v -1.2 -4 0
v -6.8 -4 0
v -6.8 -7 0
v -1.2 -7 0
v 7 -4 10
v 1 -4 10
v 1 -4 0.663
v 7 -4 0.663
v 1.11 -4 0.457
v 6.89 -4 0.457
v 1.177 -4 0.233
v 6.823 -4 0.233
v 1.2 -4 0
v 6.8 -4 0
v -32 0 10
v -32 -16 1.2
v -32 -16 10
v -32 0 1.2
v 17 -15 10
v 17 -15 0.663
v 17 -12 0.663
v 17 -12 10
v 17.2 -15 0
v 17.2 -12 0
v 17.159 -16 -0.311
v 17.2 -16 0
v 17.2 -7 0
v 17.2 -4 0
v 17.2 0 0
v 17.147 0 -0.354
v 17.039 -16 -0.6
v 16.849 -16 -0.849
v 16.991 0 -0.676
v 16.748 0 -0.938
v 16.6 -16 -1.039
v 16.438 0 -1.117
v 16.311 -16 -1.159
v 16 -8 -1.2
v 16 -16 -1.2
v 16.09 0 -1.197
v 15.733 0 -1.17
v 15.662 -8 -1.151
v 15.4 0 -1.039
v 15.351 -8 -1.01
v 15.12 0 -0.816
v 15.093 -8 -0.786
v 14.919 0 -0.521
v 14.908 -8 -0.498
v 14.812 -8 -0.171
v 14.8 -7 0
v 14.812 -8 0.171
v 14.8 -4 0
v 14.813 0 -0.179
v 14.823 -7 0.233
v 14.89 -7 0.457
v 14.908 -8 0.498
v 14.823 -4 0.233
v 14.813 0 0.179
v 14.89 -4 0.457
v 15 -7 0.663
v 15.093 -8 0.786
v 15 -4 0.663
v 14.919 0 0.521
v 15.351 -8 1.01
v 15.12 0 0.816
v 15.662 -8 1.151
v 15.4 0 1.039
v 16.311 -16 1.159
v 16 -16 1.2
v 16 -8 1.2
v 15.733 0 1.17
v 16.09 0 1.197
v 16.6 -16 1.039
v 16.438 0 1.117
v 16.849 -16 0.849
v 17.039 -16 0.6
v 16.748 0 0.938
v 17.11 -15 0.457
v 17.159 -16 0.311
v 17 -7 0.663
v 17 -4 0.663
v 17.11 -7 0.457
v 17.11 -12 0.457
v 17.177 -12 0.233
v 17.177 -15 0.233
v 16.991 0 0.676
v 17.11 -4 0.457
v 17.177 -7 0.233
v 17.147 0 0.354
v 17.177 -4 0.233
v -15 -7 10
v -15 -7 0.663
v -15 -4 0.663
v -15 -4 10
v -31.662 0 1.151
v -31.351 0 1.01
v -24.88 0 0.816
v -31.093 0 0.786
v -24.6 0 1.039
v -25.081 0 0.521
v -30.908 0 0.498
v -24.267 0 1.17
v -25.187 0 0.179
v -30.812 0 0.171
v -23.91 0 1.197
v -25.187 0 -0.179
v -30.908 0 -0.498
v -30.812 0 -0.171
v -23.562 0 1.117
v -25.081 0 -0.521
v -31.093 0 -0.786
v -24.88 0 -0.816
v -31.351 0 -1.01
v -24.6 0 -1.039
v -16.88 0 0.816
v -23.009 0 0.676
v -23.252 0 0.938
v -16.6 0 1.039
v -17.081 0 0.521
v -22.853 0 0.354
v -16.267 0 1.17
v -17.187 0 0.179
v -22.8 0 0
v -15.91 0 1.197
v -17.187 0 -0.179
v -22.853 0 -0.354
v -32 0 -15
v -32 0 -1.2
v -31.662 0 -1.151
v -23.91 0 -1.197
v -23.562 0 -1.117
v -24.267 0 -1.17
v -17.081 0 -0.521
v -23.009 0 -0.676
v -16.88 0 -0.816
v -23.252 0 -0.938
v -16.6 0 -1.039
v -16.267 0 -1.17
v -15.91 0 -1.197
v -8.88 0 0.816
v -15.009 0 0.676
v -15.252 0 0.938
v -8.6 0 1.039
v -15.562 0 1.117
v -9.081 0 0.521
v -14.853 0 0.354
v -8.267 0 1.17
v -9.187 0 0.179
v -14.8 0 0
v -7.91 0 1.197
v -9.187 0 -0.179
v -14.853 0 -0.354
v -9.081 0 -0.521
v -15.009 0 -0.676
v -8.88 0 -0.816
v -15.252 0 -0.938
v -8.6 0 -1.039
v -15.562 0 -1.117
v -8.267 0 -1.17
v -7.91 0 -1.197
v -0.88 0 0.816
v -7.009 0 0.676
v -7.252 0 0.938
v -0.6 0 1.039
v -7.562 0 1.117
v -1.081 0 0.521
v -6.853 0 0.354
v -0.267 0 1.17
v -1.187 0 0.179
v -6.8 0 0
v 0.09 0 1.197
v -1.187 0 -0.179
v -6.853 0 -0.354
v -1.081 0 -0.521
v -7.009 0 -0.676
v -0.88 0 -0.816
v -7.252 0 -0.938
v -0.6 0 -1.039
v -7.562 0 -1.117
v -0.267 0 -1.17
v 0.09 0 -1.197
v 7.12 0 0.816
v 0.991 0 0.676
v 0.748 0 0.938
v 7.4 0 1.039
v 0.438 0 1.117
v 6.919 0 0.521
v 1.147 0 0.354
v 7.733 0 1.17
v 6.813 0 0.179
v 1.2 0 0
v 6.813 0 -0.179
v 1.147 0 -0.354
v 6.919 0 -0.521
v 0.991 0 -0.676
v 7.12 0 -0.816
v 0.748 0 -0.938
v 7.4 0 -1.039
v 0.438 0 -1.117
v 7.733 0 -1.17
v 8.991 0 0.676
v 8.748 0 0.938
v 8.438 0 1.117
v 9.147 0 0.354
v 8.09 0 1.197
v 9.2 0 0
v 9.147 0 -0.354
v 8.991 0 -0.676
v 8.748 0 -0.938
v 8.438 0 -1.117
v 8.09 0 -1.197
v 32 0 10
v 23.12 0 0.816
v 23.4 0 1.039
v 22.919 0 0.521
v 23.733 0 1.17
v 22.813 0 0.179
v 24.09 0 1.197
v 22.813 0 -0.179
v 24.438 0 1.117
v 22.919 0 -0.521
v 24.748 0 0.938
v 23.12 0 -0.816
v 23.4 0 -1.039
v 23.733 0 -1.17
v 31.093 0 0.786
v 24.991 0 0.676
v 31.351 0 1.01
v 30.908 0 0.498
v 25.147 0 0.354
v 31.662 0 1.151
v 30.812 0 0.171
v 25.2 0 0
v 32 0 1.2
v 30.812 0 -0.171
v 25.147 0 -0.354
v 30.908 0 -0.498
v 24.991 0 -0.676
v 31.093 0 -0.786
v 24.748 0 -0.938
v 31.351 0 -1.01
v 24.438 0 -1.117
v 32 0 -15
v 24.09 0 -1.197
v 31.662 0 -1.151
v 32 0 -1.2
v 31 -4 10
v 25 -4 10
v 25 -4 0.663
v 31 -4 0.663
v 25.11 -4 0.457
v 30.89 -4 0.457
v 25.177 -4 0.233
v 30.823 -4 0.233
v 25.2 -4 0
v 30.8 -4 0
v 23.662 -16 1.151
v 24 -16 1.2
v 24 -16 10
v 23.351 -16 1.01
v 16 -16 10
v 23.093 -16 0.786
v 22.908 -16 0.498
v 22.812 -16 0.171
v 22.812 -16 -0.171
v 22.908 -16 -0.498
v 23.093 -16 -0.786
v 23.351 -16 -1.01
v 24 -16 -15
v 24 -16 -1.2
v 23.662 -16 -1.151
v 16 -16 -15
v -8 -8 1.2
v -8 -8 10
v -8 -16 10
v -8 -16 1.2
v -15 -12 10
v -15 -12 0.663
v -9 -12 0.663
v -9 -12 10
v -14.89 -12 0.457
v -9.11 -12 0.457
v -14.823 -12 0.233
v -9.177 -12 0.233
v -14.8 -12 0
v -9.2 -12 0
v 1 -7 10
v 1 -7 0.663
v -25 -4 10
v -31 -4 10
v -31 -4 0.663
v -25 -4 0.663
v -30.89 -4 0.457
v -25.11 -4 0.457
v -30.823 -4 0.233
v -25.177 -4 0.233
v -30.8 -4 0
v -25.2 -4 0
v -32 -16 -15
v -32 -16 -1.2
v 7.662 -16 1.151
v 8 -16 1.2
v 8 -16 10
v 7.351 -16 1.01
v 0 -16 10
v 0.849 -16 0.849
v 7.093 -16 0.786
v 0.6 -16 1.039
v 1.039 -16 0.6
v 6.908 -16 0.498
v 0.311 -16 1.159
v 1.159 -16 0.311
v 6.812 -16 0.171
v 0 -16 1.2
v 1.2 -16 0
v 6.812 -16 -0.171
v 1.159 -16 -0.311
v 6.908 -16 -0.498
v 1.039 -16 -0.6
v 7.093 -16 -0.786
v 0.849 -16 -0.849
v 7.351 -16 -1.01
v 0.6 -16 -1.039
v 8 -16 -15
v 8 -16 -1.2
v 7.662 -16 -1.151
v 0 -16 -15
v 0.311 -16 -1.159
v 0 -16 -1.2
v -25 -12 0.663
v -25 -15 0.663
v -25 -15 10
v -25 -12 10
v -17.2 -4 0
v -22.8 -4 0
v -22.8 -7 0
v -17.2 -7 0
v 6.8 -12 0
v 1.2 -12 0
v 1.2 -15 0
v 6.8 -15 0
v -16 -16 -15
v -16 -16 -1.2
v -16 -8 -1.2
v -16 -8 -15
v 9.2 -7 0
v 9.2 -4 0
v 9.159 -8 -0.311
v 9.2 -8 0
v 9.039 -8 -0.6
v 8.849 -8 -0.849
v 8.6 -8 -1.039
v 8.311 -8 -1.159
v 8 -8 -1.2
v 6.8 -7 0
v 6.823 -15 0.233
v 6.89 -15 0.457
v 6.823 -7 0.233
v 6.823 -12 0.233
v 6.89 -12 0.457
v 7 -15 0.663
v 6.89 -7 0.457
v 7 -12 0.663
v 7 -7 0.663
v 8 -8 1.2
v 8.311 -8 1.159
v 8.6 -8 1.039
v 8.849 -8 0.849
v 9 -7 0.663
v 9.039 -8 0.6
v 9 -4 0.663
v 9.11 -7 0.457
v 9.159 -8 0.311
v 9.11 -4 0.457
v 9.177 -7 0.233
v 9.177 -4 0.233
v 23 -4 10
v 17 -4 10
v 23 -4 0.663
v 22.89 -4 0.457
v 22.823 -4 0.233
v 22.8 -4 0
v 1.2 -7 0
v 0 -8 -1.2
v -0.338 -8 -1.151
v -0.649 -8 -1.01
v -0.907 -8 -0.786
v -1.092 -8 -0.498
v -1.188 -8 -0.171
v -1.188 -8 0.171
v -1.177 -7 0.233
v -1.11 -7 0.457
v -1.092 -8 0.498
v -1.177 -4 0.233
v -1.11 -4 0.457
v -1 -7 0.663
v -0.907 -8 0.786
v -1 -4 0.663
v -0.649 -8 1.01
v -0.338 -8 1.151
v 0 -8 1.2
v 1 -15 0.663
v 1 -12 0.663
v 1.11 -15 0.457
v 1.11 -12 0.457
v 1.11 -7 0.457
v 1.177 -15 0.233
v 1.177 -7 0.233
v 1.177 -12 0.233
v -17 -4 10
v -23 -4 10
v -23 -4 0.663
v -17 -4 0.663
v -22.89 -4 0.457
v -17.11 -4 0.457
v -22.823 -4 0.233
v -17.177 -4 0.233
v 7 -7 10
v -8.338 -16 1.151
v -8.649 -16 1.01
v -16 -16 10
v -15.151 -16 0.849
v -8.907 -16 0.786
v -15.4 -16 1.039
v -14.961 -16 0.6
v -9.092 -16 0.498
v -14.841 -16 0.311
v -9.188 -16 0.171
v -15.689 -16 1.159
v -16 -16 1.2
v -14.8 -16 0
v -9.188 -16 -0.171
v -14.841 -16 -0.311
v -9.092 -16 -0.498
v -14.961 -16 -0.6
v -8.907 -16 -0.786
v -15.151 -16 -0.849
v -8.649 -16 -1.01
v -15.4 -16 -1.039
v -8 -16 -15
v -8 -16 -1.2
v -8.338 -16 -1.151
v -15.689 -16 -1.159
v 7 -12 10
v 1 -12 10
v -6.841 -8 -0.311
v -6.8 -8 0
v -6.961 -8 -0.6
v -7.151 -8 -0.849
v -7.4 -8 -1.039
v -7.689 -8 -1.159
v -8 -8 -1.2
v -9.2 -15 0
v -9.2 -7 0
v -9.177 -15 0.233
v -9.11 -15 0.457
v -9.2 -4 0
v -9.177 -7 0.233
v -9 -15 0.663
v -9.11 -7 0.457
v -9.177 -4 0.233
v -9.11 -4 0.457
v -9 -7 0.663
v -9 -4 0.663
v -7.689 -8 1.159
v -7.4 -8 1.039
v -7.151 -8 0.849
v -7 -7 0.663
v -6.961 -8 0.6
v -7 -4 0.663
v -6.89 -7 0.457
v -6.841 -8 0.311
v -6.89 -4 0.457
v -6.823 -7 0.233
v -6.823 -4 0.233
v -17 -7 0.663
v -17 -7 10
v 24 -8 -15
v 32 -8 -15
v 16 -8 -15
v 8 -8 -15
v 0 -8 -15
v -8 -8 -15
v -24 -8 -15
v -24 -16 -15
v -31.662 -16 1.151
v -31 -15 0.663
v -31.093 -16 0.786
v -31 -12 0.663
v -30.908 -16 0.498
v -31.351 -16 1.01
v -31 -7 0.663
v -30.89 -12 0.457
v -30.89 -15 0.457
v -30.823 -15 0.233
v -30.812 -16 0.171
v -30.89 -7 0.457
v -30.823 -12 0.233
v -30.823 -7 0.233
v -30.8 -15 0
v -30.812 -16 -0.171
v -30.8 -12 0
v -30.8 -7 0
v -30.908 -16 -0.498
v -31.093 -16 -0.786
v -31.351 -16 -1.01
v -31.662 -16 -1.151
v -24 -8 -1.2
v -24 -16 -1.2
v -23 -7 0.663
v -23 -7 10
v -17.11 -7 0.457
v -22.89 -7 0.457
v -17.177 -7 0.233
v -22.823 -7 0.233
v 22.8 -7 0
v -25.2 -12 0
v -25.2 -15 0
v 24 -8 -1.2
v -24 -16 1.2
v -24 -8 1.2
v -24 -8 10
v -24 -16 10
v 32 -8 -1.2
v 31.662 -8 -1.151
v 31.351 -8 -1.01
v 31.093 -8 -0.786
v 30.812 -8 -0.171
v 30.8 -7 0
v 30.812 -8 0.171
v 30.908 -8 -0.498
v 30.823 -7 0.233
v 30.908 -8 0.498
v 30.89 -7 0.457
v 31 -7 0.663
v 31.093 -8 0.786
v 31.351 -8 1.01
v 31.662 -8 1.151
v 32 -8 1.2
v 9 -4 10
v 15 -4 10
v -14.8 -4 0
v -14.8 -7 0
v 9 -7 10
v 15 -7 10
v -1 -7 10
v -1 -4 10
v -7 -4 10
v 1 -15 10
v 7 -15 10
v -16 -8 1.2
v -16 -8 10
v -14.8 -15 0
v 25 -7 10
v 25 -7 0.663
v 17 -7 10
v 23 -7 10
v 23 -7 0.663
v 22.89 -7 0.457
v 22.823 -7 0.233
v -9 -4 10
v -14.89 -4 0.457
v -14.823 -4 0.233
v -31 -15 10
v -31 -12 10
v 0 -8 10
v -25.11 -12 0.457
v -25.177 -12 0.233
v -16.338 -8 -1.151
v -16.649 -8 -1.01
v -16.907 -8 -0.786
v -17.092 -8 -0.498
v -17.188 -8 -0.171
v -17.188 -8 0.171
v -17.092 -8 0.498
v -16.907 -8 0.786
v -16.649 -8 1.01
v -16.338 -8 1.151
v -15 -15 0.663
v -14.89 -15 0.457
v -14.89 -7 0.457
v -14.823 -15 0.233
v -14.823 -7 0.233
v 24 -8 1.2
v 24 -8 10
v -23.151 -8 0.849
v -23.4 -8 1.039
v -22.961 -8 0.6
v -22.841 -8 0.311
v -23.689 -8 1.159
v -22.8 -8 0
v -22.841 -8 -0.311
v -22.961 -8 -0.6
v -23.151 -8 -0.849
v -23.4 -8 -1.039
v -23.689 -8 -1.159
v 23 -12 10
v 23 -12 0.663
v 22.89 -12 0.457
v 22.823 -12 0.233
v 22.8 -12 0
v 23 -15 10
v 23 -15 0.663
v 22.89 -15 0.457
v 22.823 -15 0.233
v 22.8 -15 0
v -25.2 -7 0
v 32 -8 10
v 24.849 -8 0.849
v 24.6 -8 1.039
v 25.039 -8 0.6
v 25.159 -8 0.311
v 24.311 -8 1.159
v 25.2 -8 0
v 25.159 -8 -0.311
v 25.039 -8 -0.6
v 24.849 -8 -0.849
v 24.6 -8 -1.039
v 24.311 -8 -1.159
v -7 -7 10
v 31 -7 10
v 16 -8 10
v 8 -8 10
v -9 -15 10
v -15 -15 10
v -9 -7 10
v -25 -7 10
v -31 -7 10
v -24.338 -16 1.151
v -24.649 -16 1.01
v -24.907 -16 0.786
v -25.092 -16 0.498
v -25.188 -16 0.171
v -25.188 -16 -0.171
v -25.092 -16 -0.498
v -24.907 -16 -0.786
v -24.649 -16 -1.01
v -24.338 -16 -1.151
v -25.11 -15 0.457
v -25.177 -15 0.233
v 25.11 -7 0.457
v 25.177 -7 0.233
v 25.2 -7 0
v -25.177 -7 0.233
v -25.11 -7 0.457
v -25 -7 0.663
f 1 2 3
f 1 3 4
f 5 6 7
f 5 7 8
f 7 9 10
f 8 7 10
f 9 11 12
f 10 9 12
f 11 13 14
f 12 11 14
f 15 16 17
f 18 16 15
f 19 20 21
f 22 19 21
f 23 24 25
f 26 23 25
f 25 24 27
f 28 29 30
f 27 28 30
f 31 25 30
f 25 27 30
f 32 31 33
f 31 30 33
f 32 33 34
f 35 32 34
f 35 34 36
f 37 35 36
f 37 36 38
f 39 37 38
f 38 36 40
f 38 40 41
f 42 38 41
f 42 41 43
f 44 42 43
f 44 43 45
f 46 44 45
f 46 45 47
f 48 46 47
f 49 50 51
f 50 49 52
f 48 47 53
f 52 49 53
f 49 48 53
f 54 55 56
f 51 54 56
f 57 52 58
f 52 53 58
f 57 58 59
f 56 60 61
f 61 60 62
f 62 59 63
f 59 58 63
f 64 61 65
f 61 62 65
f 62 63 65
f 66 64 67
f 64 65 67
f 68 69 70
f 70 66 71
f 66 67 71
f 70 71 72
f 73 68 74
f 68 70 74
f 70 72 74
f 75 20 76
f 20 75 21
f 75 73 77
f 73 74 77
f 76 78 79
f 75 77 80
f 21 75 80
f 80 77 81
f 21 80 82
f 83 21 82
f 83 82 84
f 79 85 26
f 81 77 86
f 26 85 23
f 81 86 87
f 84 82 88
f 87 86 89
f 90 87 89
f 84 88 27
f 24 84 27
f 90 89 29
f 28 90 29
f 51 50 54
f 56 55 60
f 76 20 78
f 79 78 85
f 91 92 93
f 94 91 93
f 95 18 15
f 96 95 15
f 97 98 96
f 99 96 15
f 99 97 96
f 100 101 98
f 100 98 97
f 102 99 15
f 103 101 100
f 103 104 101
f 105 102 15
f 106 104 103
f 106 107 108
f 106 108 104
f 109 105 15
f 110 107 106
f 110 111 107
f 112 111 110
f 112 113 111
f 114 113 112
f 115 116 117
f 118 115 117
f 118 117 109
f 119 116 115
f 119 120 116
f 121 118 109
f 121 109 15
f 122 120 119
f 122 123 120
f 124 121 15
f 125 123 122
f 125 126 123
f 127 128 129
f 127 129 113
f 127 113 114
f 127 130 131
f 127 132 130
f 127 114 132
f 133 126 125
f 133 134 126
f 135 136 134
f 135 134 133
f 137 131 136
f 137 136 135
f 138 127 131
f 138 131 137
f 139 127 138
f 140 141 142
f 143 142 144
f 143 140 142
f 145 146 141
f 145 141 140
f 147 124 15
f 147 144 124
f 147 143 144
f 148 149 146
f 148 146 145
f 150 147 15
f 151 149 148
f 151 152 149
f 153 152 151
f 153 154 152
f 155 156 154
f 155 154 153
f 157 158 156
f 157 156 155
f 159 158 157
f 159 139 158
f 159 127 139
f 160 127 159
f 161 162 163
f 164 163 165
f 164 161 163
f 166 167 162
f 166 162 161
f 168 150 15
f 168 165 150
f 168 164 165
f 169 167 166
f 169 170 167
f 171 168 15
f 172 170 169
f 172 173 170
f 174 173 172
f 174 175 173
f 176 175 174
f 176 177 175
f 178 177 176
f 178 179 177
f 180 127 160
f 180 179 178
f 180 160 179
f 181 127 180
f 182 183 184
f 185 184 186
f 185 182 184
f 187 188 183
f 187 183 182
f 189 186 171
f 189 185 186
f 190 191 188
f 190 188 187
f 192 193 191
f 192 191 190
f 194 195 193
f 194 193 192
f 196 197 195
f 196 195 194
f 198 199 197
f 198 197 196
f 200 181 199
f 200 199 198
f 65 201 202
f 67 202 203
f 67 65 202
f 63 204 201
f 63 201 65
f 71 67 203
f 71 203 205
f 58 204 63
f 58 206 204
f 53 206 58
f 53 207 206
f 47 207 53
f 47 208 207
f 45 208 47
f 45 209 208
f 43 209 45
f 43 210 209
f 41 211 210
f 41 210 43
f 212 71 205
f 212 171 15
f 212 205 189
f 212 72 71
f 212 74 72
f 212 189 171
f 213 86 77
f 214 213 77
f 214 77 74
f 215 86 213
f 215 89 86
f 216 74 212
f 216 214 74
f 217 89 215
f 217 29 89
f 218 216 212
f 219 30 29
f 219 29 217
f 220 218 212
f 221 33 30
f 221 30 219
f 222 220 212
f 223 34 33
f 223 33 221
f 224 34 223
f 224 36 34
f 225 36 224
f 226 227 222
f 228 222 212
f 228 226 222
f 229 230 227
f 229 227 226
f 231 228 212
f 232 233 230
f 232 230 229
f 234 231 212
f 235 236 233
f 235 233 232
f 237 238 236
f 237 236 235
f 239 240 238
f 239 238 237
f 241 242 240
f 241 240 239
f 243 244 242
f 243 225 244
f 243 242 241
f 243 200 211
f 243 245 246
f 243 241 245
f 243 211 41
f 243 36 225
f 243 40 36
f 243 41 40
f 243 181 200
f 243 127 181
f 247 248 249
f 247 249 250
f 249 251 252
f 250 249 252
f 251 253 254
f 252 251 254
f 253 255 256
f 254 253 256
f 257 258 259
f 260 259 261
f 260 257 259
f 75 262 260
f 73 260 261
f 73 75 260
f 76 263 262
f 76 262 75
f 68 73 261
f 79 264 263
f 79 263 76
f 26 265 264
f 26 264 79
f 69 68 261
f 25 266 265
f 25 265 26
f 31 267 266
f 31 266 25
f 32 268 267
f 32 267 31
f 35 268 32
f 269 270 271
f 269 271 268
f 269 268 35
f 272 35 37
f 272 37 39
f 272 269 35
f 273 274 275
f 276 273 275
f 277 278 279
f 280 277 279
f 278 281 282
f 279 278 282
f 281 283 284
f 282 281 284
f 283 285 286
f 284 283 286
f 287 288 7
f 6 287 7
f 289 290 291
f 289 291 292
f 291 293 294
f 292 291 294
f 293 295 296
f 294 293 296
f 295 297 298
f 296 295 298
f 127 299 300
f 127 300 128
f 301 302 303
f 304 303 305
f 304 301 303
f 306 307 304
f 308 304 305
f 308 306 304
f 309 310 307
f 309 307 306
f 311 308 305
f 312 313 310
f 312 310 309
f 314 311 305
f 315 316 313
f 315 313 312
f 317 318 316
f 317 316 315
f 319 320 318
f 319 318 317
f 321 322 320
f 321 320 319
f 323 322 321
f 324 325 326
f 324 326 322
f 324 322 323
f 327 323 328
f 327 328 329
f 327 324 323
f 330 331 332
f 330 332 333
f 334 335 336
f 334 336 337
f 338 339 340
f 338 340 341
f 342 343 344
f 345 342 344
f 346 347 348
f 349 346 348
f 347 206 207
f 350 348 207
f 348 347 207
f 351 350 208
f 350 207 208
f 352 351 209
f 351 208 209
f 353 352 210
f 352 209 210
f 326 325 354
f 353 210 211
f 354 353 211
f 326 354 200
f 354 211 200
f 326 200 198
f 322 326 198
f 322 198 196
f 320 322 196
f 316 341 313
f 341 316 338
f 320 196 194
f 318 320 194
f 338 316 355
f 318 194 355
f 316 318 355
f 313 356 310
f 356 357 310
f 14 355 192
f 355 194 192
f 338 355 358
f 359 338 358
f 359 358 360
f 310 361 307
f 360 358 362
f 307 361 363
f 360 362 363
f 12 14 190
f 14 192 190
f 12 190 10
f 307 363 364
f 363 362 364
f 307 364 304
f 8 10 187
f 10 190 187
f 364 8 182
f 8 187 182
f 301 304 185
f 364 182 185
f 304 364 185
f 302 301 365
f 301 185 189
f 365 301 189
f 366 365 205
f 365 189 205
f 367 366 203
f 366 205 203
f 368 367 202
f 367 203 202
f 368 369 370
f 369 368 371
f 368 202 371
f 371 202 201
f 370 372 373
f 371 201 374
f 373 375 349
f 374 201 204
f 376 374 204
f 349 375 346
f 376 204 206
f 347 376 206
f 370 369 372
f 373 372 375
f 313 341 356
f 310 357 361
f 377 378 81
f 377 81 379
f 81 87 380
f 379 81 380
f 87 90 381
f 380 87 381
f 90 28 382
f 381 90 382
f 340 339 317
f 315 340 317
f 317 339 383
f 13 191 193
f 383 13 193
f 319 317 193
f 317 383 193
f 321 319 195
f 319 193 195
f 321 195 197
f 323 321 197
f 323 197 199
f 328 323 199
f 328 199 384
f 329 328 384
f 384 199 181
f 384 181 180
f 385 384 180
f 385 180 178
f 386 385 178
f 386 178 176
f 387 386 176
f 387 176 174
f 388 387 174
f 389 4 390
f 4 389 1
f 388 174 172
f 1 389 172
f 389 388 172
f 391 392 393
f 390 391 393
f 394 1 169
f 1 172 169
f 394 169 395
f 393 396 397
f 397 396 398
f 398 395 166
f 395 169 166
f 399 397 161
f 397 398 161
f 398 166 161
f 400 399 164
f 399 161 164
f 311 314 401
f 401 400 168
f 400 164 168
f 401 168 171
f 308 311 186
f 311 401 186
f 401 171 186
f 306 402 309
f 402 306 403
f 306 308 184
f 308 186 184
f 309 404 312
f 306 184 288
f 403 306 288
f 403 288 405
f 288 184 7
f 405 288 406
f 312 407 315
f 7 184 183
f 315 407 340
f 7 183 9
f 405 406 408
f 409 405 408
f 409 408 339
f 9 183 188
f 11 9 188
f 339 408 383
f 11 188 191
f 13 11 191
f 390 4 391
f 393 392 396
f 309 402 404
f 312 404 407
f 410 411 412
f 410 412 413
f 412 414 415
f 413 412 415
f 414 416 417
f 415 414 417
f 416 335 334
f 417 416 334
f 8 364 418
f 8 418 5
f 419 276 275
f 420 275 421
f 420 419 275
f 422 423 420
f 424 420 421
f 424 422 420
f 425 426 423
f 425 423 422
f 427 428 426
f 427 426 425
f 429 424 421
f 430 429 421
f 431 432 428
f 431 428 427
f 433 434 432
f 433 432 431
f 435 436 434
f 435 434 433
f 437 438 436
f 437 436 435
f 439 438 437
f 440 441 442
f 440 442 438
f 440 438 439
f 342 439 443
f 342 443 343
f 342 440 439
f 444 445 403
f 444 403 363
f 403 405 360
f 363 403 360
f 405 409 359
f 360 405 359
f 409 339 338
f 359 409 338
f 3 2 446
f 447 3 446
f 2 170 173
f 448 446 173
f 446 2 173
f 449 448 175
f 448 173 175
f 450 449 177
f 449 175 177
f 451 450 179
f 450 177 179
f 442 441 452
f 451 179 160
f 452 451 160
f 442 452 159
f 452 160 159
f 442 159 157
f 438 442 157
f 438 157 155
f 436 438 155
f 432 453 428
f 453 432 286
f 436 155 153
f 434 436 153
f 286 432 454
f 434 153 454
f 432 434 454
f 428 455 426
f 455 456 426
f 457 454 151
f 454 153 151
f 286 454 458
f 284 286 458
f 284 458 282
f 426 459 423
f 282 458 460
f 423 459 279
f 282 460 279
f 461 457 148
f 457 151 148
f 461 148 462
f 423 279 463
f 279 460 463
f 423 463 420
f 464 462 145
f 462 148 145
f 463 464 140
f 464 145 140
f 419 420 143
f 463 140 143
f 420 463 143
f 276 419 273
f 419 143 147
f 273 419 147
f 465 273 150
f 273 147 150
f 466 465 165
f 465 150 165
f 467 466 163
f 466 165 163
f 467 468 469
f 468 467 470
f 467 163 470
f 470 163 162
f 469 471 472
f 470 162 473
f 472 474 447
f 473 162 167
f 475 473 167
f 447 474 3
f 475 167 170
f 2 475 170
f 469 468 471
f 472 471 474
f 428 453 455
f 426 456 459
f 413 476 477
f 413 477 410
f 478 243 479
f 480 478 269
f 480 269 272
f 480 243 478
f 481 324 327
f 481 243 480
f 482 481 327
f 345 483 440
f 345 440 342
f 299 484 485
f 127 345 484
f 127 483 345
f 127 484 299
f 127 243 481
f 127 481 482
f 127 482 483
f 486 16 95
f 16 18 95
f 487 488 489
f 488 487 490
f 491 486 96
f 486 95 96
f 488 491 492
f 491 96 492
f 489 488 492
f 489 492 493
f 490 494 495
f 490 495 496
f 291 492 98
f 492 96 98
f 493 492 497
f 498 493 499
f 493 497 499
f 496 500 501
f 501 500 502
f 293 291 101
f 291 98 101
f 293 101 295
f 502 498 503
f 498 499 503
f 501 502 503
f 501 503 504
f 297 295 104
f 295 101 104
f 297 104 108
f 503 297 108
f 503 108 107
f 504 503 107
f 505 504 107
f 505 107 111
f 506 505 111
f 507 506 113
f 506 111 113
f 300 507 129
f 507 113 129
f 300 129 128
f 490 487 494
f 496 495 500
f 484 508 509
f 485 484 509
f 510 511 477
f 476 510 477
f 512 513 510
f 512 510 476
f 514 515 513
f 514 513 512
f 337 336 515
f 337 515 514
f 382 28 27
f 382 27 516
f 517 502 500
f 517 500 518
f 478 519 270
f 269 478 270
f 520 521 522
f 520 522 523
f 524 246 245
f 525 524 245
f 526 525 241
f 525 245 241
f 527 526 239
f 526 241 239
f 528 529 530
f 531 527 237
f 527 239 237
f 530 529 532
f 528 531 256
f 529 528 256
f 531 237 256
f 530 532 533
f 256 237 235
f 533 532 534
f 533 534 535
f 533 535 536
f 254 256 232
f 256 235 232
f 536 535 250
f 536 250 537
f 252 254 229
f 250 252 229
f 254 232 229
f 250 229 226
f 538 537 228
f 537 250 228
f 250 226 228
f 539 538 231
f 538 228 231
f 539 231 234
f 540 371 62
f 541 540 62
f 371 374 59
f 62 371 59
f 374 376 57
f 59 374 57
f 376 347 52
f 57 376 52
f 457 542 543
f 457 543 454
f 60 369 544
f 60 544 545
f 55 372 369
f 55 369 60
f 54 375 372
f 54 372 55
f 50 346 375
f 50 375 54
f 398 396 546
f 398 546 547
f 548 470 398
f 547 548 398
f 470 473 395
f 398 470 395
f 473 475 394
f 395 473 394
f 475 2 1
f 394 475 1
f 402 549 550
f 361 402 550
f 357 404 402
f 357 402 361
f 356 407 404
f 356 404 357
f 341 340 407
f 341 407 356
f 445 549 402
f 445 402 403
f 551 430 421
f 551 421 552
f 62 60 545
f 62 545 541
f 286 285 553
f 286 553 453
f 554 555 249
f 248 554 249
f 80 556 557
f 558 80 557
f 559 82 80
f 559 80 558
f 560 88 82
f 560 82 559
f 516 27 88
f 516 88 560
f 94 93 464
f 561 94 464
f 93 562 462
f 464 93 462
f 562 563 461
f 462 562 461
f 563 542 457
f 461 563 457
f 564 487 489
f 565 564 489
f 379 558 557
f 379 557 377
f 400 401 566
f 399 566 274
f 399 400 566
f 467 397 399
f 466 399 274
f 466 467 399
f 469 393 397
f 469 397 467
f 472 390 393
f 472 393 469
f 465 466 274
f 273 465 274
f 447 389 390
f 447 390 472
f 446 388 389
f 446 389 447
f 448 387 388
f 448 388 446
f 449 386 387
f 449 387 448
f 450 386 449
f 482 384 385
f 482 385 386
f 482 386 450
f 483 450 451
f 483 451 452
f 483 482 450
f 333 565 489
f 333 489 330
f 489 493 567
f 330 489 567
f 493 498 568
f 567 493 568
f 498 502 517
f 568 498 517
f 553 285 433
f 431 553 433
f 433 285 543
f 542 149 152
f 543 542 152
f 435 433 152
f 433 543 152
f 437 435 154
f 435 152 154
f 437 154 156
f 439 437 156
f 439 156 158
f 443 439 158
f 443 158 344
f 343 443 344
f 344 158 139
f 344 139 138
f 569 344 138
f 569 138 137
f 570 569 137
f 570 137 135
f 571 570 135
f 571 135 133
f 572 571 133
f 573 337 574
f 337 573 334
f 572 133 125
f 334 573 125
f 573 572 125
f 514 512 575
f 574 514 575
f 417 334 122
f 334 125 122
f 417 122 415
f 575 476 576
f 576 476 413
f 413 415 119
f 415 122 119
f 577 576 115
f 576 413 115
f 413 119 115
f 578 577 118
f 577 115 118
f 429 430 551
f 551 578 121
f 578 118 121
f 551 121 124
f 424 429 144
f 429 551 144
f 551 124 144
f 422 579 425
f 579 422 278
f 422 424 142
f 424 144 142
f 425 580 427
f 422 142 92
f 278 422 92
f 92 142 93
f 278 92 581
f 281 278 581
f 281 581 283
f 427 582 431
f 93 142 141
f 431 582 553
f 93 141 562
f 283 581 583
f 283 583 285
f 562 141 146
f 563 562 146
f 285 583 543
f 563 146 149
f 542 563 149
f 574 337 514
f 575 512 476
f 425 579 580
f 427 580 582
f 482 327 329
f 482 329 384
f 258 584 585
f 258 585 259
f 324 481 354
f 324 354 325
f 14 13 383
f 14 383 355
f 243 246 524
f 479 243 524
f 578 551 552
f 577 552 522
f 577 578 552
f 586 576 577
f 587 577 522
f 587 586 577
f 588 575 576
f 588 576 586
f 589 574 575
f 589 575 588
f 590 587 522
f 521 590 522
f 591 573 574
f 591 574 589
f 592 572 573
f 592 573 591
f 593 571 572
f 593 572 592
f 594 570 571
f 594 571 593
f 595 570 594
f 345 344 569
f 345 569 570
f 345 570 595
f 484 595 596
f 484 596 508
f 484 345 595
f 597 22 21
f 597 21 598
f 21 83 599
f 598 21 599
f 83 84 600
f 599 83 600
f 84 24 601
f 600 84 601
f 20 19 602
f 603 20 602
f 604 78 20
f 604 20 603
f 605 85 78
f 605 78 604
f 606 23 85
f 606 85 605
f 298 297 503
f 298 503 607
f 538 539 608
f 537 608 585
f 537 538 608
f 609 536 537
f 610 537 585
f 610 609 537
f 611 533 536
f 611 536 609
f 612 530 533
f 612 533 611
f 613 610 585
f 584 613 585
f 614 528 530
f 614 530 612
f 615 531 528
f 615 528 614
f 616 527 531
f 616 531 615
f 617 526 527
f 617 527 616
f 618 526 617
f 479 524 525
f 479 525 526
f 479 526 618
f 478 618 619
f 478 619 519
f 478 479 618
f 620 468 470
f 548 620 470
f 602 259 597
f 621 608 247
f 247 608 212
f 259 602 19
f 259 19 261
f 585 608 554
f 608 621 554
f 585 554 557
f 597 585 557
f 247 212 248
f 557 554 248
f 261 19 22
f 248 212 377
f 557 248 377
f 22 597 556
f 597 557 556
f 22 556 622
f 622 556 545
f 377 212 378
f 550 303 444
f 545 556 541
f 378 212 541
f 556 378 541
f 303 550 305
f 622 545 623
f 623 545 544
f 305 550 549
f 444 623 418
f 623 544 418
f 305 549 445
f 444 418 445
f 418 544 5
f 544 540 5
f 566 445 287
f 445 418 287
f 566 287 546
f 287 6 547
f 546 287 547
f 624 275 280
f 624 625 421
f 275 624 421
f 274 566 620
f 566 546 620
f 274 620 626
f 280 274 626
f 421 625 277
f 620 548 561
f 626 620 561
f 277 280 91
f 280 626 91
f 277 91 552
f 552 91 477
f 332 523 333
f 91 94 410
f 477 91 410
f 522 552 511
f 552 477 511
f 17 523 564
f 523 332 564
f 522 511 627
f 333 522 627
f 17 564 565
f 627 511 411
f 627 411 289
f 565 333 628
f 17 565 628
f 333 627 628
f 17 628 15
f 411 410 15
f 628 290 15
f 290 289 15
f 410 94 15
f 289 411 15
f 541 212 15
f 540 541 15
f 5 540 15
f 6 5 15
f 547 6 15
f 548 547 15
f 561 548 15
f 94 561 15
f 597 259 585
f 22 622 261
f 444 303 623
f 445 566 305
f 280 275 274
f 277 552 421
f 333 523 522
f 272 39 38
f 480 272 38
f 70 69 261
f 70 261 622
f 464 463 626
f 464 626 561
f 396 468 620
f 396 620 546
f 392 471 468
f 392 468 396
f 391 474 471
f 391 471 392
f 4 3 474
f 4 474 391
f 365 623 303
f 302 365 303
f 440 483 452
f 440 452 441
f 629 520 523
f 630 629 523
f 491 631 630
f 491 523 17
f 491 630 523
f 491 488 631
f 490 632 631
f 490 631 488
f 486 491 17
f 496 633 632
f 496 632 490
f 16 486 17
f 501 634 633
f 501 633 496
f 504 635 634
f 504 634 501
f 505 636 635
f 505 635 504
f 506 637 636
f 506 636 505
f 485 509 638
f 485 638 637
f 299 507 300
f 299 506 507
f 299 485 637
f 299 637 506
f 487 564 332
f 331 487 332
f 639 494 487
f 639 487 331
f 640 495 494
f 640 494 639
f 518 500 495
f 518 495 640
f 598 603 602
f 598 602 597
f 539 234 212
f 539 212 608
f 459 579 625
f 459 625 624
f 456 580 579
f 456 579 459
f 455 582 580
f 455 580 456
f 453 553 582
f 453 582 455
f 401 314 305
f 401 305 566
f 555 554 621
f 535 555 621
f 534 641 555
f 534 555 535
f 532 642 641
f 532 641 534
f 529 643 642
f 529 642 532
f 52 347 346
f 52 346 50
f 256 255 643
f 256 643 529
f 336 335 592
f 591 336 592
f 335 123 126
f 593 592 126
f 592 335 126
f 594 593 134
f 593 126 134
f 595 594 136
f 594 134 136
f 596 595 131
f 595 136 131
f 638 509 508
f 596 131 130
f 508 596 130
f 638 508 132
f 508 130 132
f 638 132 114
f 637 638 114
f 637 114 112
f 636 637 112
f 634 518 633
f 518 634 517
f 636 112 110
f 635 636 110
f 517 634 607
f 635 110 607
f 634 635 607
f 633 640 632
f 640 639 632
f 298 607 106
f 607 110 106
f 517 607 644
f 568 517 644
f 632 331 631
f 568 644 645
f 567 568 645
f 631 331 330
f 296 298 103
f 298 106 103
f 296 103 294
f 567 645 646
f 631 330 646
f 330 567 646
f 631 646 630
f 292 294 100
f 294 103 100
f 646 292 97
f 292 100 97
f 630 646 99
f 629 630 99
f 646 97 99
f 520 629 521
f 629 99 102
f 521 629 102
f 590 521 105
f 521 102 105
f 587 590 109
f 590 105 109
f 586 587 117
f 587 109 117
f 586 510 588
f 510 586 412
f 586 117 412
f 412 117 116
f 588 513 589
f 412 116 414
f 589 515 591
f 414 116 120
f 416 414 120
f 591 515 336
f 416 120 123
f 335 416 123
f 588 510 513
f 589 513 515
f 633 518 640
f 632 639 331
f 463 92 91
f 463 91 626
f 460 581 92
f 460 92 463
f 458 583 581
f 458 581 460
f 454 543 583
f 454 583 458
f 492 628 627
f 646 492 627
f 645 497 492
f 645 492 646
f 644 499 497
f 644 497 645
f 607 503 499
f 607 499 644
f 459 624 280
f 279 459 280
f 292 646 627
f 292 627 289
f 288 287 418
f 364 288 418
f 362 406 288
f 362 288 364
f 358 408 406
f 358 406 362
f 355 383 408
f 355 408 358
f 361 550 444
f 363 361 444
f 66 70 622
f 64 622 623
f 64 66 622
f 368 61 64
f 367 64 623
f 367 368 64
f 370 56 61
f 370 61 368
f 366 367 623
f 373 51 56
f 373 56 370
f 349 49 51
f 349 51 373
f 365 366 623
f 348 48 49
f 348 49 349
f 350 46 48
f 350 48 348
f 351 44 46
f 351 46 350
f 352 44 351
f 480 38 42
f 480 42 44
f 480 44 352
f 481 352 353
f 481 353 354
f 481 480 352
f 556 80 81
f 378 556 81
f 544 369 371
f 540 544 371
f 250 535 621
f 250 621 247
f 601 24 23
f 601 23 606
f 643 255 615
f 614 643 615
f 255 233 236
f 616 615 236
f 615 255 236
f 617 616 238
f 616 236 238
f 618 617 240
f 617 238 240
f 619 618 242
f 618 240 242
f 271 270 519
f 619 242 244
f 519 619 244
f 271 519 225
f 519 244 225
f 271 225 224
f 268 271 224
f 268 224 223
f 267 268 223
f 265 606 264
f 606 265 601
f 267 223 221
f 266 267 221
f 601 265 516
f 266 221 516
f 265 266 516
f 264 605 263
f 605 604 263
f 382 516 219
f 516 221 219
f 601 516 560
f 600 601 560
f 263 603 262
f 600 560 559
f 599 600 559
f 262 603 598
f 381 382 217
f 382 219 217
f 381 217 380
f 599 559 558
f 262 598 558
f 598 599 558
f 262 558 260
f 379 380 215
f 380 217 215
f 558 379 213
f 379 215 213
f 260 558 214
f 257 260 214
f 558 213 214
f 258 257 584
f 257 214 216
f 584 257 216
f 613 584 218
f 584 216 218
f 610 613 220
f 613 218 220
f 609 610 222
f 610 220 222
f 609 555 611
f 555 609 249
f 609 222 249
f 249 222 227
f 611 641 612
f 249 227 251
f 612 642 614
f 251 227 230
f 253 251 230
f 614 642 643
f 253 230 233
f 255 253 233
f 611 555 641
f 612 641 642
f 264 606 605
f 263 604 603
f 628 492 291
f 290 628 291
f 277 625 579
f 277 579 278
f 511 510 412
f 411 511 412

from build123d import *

# Parameters (mm, degrees)
BOSS_EXTRUDE1_DEPTH      = 10
BOSS_EXTRUDE1_DEPTH_BACK = 15
SKETCH2_R                = 1.2
CUT_EXTRUDE1_DEPTH       = 39.794329483
LPATTERN1_COUNT          = 9
LPATTERN1_PITCH          = 8
CUT_EXTRUDE2_START       = -10
SKETCH3_W                = 6
SKETCH3_H                = 3
CUT_EXTRUDE2_DEPTH       = 10
LPATTERN2_COUNT          = 8
LPATTERN2_PITCH          = 8
LPATTERN2_COUNT_DIR2     = 2
LPATTERN2_PITCH_DIR2     = 8


with BuildPart() as part:
    # Sketch1 → Boss-Extrude1 (new, two sides: drawn at the far end of the back side and taken through both)
    with BuildSketch(Plane.XY.offset(-BOSS_EXTRUDE1_DEPTH_BACK)):
        Polygon((-32, 0), (32, 0), (32, -8), (24, -8), (24, -16), (16, -16), (16, -8), (8, -8), (8, -16), (0, -16), (0, -8), (-8, -8), (-8, -16), (-16, -16), (-16, -8), (-24, -8), (-24, -16), (-32, -16), align=None)
    extrude(amount=BOSS_EXTRUDE1_DEPTH + BOSS_EXTRUDE1_DEPTH_BACK)

    # Sketch2 → Cut-Extrude1 (cut, through all)
    with BuildSketch(Plane(origin=(0, 0, 0), x_dir=(1, 0, 0), z_dir=(0, 1, 0))):
        with Locations((-32, 0)):
            Circle(SKETCH2_R)
    cut_extrude1 = extrude(amount=-CUT_EXTRUDE1_DEPTH, mode=Mode.SUBTRACT)

    # LPattern1: Cut-Extrude1 ×9
    with Locations(*[(i * LPATTERN1_PITCH, 0, 0) for i in range(1, LPATTERN1_COUNT)]):
        add(cut_extrude1, mode=Mode.SUBTRACT)

    # Sketch3 → Cut-Extrude2 (cut)
    with BuildSketch(Plane.XY.offset(10).offset(CUT_EXTRUDE2_START)):
        with Locations((-28, -5.5)):
            Rectangle(SKETCH3_W, SKETCH3_H)
    cut_extrude2 = extrude(amount=CUT_EXTRUDE2_DEPTH, mode=Mode.SUBTRACT)

    # LPattern2: Cut-Extrude2 8 × 2
    with Locations(*[(i * LPATTERN2_PITCH, -j * LPATTERN2_PITCH_DIR2, 0) for i in range(LPATTERN2_COUNT) for j in range(LPATTERN2_COUNT_DIR2) if (i, j) != (0, 0)]):
        add(cut_extrude2, mode=Mode.SUBTRACT)


solid = part.part
